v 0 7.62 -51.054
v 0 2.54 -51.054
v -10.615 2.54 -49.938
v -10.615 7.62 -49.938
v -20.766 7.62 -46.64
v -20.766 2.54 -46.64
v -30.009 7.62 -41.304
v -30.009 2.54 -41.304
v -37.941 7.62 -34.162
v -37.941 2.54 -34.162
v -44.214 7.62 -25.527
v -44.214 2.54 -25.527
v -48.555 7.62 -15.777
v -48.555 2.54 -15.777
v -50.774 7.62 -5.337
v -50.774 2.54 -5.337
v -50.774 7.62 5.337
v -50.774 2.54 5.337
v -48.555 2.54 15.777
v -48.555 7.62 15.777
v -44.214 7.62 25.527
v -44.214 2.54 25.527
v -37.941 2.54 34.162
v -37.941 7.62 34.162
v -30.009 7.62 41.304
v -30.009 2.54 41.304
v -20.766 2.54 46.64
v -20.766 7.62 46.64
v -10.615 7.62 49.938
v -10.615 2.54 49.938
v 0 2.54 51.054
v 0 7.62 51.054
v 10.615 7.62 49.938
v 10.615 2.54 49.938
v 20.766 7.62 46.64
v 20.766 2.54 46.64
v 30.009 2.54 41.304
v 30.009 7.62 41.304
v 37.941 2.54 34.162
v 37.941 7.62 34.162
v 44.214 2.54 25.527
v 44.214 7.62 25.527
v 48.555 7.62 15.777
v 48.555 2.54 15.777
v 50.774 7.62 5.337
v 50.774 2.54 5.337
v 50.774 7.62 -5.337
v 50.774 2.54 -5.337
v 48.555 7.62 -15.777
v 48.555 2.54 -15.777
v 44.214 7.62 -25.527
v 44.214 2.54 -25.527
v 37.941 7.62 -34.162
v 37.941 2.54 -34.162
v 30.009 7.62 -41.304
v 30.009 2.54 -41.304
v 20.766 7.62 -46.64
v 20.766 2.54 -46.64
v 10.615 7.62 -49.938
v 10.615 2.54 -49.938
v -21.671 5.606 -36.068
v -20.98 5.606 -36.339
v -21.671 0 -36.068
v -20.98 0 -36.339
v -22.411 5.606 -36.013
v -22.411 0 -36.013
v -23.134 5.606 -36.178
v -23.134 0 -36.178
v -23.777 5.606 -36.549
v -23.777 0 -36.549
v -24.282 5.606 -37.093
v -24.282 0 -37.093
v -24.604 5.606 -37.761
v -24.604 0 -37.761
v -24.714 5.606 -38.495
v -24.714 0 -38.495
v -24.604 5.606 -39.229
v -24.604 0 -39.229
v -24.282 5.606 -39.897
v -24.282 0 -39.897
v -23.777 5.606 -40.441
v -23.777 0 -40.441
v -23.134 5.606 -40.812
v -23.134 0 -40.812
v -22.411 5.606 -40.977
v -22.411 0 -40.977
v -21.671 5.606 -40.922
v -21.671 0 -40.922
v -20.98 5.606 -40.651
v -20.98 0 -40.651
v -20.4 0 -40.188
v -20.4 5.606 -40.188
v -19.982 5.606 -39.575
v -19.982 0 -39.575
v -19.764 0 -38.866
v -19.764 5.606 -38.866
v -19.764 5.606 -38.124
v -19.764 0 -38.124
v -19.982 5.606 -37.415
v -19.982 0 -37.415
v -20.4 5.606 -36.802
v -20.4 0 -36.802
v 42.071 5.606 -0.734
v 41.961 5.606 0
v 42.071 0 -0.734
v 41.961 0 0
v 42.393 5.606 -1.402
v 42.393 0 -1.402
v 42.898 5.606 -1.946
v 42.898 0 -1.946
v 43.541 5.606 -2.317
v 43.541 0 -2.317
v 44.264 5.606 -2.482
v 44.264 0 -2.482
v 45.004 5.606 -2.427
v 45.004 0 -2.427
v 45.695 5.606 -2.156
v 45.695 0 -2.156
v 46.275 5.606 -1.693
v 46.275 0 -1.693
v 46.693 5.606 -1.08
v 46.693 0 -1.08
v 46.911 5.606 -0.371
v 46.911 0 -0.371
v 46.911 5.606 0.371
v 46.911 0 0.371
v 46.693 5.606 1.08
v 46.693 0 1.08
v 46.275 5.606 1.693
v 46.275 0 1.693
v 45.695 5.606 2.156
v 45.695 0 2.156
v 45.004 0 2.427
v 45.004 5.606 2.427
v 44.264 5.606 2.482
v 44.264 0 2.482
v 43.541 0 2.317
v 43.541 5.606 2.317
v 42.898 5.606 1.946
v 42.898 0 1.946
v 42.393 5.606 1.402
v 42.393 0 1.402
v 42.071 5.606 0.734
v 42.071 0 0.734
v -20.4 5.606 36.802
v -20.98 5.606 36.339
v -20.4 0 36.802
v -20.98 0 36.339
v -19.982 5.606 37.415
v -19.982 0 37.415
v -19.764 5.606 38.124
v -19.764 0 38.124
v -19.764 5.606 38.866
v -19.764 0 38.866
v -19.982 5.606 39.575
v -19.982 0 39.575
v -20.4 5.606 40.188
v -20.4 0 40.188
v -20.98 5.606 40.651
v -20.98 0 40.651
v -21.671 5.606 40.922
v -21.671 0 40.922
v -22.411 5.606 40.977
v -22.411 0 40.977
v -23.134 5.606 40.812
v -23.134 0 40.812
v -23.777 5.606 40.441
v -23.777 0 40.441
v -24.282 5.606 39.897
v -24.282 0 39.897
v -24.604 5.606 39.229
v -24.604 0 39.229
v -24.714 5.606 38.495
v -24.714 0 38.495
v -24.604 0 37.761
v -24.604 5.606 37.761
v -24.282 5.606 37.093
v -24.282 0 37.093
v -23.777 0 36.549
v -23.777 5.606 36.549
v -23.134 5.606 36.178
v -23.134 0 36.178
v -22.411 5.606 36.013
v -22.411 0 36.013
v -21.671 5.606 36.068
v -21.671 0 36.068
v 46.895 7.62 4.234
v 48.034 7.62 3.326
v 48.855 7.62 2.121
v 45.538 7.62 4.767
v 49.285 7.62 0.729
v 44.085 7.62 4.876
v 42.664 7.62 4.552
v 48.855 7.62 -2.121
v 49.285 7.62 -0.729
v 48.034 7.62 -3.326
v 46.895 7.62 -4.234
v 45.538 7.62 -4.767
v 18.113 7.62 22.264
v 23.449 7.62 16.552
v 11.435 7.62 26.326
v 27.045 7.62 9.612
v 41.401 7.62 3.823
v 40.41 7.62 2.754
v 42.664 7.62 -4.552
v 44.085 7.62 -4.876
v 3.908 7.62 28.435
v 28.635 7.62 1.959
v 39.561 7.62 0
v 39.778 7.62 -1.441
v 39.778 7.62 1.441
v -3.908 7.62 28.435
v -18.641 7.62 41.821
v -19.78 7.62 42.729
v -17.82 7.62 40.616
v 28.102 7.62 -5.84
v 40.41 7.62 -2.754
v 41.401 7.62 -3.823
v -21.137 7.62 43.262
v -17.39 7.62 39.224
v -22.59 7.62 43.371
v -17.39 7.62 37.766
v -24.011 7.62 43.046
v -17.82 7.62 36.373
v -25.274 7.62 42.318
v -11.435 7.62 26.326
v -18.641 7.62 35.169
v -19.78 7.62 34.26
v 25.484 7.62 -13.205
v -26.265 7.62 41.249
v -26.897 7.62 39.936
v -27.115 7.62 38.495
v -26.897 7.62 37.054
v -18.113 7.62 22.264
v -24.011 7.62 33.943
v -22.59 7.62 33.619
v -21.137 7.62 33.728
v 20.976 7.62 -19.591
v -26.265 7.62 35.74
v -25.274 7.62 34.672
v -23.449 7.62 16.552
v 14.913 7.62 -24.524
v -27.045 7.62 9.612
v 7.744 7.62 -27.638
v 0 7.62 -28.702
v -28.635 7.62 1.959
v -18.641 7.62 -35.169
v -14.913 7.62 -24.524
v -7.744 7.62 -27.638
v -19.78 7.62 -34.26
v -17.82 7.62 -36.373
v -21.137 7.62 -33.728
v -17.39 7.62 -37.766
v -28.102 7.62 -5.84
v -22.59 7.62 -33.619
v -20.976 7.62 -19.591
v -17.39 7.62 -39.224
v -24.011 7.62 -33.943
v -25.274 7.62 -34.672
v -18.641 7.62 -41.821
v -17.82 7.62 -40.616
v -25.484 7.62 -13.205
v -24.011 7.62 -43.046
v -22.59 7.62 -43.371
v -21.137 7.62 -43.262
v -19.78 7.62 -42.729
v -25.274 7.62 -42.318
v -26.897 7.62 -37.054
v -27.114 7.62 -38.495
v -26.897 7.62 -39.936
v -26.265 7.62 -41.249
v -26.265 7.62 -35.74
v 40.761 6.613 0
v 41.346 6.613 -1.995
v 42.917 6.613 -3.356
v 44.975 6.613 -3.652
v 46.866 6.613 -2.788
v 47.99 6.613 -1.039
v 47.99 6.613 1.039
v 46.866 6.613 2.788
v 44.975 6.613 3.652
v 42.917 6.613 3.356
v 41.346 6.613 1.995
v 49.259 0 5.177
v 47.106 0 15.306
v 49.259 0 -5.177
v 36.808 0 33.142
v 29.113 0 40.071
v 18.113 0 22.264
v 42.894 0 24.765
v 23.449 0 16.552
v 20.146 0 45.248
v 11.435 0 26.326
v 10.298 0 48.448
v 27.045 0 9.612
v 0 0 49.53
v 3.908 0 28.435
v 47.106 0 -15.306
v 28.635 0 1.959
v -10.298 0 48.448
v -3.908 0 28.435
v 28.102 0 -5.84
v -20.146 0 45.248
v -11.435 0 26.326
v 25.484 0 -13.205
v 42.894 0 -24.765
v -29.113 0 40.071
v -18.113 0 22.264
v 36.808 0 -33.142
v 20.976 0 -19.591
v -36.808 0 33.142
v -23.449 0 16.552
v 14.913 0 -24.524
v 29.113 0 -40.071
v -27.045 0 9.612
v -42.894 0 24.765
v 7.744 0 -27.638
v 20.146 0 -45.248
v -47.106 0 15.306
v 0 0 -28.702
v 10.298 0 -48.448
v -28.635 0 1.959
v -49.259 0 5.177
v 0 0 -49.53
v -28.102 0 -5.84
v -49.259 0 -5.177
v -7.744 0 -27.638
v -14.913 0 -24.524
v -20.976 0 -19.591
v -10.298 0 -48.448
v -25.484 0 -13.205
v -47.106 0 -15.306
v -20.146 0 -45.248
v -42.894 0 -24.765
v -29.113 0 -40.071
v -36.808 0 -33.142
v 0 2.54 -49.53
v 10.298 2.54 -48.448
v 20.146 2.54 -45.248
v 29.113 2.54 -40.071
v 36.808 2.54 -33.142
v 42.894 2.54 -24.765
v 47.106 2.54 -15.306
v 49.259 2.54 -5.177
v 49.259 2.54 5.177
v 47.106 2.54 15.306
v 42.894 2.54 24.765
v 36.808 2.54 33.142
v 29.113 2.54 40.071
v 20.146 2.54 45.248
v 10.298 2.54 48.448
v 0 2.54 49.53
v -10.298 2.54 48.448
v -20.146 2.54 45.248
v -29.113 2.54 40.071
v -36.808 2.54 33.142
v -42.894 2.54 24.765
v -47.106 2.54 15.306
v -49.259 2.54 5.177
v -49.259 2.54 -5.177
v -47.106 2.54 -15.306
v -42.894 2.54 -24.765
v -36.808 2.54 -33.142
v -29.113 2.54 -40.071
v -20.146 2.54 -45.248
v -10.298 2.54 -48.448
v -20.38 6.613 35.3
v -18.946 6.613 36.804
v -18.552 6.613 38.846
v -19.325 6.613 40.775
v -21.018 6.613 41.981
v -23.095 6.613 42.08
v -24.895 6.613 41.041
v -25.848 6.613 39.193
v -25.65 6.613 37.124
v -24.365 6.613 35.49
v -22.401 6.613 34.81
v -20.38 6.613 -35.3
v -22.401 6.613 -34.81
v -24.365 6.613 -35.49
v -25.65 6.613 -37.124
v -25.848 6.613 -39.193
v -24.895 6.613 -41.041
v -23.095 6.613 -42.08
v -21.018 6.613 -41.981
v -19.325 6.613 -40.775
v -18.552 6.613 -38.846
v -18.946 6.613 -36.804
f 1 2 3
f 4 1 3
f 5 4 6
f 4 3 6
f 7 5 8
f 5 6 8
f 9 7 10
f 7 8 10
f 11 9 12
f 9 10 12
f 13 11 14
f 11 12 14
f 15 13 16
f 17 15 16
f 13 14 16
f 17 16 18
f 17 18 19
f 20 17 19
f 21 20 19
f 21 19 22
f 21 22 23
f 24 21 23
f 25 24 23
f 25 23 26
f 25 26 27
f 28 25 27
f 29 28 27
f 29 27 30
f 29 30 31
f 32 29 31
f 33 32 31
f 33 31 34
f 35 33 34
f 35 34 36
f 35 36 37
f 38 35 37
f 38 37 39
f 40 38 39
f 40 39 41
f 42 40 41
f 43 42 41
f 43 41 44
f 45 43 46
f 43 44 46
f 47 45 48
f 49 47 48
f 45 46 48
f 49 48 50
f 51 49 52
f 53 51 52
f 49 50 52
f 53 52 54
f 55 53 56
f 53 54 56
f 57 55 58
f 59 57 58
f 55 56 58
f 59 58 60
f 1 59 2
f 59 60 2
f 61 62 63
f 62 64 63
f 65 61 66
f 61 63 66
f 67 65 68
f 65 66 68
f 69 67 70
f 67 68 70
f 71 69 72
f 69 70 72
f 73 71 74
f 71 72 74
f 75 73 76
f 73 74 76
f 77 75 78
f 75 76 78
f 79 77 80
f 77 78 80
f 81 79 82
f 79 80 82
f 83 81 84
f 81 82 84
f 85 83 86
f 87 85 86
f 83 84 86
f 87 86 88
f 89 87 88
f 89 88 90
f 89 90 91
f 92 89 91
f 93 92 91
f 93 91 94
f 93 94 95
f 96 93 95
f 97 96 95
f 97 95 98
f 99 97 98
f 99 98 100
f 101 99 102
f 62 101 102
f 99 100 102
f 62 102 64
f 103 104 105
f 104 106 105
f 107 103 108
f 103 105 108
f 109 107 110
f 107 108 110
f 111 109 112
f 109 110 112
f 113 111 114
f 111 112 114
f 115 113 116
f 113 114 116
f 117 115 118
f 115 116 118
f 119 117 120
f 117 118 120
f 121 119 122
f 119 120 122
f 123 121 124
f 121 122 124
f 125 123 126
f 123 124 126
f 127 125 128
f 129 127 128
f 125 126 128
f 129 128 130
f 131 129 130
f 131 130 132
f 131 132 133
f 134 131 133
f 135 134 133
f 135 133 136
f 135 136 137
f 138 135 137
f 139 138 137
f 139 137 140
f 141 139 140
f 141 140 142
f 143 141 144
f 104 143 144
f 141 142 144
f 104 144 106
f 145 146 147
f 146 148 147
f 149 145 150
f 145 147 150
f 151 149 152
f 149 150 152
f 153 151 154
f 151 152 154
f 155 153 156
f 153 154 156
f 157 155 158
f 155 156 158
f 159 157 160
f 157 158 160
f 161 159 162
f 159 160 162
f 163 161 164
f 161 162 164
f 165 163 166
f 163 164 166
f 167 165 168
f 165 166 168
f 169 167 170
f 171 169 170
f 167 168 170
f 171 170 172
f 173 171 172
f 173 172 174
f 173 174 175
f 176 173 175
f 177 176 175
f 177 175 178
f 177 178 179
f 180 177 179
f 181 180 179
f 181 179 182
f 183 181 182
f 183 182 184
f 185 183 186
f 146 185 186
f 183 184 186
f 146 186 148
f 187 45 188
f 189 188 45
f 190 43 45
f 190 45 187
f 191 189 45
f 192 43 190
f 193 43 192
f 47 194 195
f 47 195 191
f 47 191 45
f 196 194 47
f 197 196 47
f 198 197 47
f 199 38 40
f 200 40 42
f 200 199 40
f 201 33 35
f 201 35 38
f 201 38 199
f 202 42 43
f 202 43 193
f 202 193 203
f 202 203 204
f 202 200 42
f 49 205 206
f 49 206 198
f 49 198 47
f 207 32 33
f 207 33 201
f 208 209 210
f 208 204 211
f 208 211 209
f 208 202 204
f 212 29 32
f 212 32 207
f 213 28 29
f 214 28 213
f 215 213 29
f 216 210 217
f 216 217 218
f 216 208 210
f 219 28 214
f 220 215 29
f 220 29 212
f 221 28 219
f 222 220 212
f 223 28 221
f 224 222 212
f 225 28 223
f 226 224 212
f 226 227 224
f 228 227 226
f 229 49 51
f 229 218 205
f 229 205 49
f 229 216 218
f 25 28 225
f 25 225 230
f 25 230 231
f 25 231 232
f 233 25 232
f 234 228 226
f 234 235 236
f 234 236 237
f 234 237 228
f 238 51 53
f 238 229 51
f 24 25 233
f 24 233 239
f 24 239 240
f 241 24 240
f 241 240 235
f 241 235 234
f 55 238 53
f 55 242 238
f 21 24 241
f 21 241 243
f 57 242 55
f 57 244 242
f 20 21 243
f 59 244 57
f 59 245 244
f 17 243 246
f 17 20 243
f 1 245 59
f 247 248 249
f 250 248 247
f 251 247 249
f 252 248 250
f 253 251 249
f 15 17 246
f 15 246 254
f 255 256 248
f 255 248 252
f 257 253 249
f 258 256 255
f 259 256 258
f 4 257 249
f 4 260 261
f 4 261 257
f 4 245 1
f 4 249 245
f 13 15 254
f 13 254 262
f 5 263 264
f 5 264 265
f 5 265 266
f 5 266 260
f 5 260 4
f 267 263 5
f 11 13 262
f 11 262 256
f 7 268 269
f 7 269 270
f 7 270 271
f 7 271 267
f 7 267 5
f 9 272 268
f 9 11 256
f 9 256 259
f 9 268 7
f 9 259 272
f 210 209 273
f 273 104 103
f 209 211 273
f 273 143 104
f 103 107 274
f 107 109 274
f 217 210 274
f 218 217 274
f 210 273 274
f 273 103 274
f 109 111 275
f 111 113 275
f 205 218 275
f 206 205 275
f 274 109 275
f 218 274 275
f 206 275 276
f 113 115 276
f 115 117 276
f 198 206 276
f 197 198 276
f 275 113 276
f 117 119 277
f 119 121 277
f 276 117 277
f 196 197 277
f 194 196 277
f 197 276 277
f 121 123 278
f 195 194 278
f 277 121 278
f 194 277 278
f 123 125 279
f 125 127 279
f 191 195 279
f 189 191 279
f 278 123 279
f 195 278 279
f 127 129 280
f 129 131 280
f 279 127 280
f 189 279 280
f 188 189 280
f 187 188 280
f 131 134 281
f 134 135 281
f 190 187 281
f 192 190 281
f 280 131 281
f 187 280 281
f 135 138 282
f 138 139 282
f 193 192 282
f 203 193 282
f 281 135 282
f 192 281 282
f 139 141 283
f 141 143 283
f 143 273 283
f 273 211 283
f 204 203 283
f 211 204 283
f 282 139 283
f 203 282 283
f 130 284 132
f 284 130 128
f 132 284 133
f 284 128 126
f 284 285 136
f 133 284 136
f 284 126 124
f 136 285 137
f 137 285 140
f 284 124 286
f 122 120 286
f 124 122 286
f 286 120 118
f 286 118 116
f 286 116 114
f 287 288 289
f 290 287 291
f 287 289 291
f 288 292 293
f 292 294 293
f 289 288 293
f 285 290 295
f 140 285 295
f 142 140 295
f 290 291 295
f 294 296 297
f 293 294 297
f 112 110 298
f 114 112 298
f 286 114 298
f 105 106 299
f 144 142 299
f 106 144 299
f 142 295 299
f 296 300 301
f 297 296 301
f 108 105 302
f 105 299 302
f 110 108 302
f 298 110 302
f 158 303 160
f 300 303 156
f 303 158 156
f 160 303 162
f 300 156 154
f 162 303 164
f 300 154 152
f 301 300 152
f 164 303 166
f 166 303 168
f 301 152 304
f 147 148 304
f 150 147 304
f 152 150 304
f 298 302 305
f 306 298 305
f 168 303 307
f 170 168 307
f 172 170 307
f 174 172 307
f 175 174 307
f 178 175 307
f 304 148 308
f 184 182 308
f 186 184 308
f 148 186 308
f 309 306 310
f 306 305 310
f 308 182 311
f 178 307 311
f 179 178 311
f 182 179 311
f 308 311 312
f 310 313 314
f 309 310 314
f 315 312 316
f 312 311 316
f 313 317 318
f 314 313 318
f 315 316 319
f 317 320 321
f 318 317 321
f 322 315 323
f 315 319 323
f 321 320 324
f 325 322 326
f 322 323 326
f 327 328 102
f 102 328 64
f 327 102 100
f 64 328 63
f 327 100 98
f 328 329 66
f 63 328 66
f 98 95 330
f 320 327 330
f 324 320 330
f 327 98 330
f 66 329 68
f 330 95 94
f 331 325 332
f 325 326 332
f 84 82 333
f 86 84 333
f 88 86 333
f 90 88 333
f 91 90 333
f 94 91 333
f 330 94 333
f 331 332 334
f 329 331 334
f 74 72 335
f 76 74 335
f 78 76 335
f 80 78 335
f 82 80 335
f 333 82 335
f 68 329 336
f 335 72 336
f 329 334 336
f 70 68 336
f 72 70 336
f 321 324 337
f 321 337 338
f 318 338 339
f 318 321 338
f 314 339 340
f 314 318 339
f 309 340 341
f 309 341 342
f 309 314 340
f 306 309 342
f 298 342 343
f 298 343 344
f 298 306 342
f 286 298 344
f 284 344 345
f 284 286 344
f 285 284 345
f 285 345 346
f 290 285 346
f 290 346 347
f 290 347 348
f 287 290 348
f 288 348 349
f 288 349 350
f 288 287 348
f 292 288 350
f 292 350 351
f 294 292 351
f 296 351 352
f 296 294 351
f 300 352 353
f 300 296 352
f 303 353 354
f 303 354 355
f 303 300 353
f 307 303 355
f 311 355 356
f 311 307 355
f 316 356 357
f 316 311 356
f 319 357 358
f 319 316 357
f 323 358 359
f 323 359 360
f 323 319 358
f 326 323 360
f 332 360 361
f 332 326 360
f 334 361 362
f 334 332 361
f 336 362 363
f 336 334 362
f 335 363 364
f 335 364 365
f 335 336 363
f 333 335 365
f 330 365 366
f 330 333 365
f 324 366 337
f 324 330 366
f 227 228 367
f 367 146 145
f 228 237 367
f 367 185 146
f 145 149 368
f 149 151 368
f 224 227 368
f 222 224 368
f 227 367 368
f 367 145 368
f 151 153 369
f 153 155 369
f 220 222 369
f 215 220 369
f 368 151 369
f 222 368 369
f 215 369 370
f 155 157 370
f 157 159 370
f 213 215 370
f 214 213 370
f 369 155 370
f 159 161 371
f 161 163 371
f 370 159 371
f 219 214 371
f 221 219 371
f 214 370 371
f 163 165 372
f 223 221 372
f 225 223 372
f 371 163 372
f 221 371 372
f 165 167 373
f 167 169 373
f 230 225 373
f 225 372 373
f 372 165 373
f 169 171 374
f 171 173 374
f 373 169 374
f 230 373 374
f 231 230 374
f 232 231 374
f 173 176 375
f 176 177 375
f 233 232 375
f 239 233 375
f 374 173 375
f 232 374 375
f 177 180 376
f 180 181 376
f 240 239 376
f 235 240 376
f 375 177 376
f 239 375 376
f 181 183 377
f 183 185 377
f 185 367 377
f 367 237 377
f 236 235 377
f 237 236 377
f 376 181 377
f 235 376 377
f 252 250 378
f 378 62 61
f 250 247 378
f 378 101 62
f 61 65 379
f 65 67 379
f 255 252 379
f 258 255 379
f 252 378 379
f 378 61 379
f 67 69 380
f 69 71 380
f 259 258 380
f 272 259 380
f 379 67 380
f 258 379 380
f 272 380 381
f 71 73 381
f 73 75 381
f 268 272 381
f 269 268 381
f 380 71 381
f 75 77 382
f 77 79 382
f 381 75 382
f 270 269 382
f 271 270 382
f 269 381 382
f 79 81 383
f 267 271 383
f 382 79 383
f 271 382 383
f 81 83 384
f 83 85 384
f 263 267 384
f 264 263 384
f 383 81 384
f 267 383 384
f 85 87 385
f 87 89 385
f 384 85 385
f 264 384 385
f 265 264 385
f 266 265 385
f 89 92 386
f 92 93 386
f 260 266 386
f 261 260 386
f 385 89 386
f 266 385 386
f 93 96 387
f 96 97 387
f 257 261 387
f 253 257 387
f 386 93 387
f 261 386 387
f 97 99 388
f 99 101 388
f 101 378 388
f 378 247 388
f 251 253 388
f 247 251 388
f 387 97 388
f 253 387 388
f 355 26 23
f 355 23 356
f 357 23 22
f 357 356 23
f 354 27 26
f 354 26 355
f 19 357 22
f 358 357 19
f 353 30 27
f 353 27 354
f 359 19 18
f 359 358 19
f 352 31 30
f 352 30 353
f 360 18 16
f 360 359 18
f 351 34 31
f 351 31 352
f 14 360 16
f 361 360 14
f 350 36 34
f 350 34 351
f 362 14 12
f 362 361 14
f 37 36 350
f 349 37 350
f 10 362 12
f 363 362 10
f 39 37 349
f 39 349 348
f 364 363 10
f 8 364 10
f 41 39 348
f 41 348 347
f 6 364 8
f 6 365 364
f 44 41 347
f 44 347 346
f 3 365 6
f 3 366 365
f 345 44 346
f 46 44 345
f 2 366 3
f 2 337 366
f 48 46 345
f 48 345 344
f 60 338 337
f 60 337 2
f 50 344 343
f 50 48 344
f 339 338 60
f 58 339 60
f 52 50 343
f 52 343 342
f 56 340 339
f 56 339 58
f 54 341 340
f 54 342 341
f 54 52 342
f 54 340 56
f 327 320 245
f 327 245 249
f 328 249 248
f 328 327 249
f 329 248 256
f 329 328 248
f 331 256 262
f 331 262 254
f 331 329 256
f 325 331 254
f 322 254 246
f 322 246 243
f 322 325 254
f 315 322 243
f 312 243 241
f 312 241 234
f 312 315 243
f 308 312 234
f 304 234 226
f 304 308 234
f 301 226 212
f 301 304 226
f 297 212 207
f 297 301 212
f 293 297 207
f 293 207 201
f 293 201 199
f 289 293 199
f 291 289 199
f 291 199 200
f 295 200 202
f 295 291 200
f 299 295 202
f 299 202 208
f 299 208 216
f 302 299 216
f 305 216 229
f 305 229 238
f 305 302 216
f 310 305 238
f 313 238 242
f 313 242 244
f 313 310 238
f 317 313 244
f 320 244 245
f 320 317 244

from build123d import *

# Parameters (mm, degrees)
SKETCH1_R                                          = 51.054
SKETCH1_R_2                                        = 28.702
BOSS_EXTRUDE1_DEPTH                                = 7.62
CSK_FOR_10_FLAT_HEAD_MACHINE_SCREW_100_D           = 4.9784
CSK_FOR_10_FLAT_HEAD_MACHINE_SCREW_100_CSINK_D     = 9.779
CSK_FOR_10_FLAT_HEAD_MACHINE_SCREW_100_CSINK_ANGLE = 100
CIRPATTERN1_COUNT                                  = 3
SKETCH6_R                                          = 51.054
SKETCH6_R_2                                        = 49.53
CUT_EXTRUDE1_DEPTH                                 = 2.54


with BuildPart() as part:
    # Sketch1 → Boss-Extrude1 (new body)
    with BuildSketch(Plane(origin=(0, 0, 0), x_dir=(1, 0, 0), z_dir=(0, 1, 0))):
        with Locations(Location((0, 0, 0), (0, 0, 90))):
            Circle(SKETCH1_R)
        with Locations(Location((0, 0, 0), (0, 0, 90))):
            Circle(SKETCH1_R_2, mode=Mode.SUBTRACT)
    extrude(amount=BOSS_EXTRUDE1_DEPTH)

    # CSK for #10 Flat Head Machine Screw (100)1 (through all)
    with Locations(Plane(origin=(0, 7.62, 0), x_dir=(1, 0, 0), z_dir=(0, 1, 0))):
        with Locations((44.45, 0)):
            csk_for_10_flat_head_machine_screw_100 = CounterSinkHole(CSK_FOR_10_FLAT_HEAD_MACHINE_SCREW_100_D / 2, CSK_FOR_10_FLAT_HEAD_MACHINE_SCREW_100_CSINK_D / 2, counter_sink_angle=CSK_FOR_10_FLAT_HEAD_MACHINE_SCREW_100_CSINK_ANGLE)

    # CirPattern1: CSK for #10 Flat Head Machine Screw (100)1 ×3 about axis
    cirpattern1_axis = Axis((0, 0, 0), (0, 1, 0))
    for i in range(1, CIRPATTERN1_COUNT):
        add(csk_for_10_flat_head_machine_screw_100.rotate(cirpattern1_axis, i * 360 / CIRPATTERN1_COUNT), mode=Mode.SUBTRACT)

    # Sketch6 → Cut-Extrude1 (cut)
    with BuildSketch(Plane.XZ):
        with Locations(Location((0, 0, 0), (0, 0, 270))):
            Circle(SKETCH6_R)
        with Locations(Location((0, 0, 0), (0, 0, 270))):
            Circle(SKETCH6_R_2, mode=Mode.SUBTRACT)
    extrude(amount=-CUT_EXTRUDE1_DEPTH, mode=Mode.SUBTRACT)


solid = part.part
